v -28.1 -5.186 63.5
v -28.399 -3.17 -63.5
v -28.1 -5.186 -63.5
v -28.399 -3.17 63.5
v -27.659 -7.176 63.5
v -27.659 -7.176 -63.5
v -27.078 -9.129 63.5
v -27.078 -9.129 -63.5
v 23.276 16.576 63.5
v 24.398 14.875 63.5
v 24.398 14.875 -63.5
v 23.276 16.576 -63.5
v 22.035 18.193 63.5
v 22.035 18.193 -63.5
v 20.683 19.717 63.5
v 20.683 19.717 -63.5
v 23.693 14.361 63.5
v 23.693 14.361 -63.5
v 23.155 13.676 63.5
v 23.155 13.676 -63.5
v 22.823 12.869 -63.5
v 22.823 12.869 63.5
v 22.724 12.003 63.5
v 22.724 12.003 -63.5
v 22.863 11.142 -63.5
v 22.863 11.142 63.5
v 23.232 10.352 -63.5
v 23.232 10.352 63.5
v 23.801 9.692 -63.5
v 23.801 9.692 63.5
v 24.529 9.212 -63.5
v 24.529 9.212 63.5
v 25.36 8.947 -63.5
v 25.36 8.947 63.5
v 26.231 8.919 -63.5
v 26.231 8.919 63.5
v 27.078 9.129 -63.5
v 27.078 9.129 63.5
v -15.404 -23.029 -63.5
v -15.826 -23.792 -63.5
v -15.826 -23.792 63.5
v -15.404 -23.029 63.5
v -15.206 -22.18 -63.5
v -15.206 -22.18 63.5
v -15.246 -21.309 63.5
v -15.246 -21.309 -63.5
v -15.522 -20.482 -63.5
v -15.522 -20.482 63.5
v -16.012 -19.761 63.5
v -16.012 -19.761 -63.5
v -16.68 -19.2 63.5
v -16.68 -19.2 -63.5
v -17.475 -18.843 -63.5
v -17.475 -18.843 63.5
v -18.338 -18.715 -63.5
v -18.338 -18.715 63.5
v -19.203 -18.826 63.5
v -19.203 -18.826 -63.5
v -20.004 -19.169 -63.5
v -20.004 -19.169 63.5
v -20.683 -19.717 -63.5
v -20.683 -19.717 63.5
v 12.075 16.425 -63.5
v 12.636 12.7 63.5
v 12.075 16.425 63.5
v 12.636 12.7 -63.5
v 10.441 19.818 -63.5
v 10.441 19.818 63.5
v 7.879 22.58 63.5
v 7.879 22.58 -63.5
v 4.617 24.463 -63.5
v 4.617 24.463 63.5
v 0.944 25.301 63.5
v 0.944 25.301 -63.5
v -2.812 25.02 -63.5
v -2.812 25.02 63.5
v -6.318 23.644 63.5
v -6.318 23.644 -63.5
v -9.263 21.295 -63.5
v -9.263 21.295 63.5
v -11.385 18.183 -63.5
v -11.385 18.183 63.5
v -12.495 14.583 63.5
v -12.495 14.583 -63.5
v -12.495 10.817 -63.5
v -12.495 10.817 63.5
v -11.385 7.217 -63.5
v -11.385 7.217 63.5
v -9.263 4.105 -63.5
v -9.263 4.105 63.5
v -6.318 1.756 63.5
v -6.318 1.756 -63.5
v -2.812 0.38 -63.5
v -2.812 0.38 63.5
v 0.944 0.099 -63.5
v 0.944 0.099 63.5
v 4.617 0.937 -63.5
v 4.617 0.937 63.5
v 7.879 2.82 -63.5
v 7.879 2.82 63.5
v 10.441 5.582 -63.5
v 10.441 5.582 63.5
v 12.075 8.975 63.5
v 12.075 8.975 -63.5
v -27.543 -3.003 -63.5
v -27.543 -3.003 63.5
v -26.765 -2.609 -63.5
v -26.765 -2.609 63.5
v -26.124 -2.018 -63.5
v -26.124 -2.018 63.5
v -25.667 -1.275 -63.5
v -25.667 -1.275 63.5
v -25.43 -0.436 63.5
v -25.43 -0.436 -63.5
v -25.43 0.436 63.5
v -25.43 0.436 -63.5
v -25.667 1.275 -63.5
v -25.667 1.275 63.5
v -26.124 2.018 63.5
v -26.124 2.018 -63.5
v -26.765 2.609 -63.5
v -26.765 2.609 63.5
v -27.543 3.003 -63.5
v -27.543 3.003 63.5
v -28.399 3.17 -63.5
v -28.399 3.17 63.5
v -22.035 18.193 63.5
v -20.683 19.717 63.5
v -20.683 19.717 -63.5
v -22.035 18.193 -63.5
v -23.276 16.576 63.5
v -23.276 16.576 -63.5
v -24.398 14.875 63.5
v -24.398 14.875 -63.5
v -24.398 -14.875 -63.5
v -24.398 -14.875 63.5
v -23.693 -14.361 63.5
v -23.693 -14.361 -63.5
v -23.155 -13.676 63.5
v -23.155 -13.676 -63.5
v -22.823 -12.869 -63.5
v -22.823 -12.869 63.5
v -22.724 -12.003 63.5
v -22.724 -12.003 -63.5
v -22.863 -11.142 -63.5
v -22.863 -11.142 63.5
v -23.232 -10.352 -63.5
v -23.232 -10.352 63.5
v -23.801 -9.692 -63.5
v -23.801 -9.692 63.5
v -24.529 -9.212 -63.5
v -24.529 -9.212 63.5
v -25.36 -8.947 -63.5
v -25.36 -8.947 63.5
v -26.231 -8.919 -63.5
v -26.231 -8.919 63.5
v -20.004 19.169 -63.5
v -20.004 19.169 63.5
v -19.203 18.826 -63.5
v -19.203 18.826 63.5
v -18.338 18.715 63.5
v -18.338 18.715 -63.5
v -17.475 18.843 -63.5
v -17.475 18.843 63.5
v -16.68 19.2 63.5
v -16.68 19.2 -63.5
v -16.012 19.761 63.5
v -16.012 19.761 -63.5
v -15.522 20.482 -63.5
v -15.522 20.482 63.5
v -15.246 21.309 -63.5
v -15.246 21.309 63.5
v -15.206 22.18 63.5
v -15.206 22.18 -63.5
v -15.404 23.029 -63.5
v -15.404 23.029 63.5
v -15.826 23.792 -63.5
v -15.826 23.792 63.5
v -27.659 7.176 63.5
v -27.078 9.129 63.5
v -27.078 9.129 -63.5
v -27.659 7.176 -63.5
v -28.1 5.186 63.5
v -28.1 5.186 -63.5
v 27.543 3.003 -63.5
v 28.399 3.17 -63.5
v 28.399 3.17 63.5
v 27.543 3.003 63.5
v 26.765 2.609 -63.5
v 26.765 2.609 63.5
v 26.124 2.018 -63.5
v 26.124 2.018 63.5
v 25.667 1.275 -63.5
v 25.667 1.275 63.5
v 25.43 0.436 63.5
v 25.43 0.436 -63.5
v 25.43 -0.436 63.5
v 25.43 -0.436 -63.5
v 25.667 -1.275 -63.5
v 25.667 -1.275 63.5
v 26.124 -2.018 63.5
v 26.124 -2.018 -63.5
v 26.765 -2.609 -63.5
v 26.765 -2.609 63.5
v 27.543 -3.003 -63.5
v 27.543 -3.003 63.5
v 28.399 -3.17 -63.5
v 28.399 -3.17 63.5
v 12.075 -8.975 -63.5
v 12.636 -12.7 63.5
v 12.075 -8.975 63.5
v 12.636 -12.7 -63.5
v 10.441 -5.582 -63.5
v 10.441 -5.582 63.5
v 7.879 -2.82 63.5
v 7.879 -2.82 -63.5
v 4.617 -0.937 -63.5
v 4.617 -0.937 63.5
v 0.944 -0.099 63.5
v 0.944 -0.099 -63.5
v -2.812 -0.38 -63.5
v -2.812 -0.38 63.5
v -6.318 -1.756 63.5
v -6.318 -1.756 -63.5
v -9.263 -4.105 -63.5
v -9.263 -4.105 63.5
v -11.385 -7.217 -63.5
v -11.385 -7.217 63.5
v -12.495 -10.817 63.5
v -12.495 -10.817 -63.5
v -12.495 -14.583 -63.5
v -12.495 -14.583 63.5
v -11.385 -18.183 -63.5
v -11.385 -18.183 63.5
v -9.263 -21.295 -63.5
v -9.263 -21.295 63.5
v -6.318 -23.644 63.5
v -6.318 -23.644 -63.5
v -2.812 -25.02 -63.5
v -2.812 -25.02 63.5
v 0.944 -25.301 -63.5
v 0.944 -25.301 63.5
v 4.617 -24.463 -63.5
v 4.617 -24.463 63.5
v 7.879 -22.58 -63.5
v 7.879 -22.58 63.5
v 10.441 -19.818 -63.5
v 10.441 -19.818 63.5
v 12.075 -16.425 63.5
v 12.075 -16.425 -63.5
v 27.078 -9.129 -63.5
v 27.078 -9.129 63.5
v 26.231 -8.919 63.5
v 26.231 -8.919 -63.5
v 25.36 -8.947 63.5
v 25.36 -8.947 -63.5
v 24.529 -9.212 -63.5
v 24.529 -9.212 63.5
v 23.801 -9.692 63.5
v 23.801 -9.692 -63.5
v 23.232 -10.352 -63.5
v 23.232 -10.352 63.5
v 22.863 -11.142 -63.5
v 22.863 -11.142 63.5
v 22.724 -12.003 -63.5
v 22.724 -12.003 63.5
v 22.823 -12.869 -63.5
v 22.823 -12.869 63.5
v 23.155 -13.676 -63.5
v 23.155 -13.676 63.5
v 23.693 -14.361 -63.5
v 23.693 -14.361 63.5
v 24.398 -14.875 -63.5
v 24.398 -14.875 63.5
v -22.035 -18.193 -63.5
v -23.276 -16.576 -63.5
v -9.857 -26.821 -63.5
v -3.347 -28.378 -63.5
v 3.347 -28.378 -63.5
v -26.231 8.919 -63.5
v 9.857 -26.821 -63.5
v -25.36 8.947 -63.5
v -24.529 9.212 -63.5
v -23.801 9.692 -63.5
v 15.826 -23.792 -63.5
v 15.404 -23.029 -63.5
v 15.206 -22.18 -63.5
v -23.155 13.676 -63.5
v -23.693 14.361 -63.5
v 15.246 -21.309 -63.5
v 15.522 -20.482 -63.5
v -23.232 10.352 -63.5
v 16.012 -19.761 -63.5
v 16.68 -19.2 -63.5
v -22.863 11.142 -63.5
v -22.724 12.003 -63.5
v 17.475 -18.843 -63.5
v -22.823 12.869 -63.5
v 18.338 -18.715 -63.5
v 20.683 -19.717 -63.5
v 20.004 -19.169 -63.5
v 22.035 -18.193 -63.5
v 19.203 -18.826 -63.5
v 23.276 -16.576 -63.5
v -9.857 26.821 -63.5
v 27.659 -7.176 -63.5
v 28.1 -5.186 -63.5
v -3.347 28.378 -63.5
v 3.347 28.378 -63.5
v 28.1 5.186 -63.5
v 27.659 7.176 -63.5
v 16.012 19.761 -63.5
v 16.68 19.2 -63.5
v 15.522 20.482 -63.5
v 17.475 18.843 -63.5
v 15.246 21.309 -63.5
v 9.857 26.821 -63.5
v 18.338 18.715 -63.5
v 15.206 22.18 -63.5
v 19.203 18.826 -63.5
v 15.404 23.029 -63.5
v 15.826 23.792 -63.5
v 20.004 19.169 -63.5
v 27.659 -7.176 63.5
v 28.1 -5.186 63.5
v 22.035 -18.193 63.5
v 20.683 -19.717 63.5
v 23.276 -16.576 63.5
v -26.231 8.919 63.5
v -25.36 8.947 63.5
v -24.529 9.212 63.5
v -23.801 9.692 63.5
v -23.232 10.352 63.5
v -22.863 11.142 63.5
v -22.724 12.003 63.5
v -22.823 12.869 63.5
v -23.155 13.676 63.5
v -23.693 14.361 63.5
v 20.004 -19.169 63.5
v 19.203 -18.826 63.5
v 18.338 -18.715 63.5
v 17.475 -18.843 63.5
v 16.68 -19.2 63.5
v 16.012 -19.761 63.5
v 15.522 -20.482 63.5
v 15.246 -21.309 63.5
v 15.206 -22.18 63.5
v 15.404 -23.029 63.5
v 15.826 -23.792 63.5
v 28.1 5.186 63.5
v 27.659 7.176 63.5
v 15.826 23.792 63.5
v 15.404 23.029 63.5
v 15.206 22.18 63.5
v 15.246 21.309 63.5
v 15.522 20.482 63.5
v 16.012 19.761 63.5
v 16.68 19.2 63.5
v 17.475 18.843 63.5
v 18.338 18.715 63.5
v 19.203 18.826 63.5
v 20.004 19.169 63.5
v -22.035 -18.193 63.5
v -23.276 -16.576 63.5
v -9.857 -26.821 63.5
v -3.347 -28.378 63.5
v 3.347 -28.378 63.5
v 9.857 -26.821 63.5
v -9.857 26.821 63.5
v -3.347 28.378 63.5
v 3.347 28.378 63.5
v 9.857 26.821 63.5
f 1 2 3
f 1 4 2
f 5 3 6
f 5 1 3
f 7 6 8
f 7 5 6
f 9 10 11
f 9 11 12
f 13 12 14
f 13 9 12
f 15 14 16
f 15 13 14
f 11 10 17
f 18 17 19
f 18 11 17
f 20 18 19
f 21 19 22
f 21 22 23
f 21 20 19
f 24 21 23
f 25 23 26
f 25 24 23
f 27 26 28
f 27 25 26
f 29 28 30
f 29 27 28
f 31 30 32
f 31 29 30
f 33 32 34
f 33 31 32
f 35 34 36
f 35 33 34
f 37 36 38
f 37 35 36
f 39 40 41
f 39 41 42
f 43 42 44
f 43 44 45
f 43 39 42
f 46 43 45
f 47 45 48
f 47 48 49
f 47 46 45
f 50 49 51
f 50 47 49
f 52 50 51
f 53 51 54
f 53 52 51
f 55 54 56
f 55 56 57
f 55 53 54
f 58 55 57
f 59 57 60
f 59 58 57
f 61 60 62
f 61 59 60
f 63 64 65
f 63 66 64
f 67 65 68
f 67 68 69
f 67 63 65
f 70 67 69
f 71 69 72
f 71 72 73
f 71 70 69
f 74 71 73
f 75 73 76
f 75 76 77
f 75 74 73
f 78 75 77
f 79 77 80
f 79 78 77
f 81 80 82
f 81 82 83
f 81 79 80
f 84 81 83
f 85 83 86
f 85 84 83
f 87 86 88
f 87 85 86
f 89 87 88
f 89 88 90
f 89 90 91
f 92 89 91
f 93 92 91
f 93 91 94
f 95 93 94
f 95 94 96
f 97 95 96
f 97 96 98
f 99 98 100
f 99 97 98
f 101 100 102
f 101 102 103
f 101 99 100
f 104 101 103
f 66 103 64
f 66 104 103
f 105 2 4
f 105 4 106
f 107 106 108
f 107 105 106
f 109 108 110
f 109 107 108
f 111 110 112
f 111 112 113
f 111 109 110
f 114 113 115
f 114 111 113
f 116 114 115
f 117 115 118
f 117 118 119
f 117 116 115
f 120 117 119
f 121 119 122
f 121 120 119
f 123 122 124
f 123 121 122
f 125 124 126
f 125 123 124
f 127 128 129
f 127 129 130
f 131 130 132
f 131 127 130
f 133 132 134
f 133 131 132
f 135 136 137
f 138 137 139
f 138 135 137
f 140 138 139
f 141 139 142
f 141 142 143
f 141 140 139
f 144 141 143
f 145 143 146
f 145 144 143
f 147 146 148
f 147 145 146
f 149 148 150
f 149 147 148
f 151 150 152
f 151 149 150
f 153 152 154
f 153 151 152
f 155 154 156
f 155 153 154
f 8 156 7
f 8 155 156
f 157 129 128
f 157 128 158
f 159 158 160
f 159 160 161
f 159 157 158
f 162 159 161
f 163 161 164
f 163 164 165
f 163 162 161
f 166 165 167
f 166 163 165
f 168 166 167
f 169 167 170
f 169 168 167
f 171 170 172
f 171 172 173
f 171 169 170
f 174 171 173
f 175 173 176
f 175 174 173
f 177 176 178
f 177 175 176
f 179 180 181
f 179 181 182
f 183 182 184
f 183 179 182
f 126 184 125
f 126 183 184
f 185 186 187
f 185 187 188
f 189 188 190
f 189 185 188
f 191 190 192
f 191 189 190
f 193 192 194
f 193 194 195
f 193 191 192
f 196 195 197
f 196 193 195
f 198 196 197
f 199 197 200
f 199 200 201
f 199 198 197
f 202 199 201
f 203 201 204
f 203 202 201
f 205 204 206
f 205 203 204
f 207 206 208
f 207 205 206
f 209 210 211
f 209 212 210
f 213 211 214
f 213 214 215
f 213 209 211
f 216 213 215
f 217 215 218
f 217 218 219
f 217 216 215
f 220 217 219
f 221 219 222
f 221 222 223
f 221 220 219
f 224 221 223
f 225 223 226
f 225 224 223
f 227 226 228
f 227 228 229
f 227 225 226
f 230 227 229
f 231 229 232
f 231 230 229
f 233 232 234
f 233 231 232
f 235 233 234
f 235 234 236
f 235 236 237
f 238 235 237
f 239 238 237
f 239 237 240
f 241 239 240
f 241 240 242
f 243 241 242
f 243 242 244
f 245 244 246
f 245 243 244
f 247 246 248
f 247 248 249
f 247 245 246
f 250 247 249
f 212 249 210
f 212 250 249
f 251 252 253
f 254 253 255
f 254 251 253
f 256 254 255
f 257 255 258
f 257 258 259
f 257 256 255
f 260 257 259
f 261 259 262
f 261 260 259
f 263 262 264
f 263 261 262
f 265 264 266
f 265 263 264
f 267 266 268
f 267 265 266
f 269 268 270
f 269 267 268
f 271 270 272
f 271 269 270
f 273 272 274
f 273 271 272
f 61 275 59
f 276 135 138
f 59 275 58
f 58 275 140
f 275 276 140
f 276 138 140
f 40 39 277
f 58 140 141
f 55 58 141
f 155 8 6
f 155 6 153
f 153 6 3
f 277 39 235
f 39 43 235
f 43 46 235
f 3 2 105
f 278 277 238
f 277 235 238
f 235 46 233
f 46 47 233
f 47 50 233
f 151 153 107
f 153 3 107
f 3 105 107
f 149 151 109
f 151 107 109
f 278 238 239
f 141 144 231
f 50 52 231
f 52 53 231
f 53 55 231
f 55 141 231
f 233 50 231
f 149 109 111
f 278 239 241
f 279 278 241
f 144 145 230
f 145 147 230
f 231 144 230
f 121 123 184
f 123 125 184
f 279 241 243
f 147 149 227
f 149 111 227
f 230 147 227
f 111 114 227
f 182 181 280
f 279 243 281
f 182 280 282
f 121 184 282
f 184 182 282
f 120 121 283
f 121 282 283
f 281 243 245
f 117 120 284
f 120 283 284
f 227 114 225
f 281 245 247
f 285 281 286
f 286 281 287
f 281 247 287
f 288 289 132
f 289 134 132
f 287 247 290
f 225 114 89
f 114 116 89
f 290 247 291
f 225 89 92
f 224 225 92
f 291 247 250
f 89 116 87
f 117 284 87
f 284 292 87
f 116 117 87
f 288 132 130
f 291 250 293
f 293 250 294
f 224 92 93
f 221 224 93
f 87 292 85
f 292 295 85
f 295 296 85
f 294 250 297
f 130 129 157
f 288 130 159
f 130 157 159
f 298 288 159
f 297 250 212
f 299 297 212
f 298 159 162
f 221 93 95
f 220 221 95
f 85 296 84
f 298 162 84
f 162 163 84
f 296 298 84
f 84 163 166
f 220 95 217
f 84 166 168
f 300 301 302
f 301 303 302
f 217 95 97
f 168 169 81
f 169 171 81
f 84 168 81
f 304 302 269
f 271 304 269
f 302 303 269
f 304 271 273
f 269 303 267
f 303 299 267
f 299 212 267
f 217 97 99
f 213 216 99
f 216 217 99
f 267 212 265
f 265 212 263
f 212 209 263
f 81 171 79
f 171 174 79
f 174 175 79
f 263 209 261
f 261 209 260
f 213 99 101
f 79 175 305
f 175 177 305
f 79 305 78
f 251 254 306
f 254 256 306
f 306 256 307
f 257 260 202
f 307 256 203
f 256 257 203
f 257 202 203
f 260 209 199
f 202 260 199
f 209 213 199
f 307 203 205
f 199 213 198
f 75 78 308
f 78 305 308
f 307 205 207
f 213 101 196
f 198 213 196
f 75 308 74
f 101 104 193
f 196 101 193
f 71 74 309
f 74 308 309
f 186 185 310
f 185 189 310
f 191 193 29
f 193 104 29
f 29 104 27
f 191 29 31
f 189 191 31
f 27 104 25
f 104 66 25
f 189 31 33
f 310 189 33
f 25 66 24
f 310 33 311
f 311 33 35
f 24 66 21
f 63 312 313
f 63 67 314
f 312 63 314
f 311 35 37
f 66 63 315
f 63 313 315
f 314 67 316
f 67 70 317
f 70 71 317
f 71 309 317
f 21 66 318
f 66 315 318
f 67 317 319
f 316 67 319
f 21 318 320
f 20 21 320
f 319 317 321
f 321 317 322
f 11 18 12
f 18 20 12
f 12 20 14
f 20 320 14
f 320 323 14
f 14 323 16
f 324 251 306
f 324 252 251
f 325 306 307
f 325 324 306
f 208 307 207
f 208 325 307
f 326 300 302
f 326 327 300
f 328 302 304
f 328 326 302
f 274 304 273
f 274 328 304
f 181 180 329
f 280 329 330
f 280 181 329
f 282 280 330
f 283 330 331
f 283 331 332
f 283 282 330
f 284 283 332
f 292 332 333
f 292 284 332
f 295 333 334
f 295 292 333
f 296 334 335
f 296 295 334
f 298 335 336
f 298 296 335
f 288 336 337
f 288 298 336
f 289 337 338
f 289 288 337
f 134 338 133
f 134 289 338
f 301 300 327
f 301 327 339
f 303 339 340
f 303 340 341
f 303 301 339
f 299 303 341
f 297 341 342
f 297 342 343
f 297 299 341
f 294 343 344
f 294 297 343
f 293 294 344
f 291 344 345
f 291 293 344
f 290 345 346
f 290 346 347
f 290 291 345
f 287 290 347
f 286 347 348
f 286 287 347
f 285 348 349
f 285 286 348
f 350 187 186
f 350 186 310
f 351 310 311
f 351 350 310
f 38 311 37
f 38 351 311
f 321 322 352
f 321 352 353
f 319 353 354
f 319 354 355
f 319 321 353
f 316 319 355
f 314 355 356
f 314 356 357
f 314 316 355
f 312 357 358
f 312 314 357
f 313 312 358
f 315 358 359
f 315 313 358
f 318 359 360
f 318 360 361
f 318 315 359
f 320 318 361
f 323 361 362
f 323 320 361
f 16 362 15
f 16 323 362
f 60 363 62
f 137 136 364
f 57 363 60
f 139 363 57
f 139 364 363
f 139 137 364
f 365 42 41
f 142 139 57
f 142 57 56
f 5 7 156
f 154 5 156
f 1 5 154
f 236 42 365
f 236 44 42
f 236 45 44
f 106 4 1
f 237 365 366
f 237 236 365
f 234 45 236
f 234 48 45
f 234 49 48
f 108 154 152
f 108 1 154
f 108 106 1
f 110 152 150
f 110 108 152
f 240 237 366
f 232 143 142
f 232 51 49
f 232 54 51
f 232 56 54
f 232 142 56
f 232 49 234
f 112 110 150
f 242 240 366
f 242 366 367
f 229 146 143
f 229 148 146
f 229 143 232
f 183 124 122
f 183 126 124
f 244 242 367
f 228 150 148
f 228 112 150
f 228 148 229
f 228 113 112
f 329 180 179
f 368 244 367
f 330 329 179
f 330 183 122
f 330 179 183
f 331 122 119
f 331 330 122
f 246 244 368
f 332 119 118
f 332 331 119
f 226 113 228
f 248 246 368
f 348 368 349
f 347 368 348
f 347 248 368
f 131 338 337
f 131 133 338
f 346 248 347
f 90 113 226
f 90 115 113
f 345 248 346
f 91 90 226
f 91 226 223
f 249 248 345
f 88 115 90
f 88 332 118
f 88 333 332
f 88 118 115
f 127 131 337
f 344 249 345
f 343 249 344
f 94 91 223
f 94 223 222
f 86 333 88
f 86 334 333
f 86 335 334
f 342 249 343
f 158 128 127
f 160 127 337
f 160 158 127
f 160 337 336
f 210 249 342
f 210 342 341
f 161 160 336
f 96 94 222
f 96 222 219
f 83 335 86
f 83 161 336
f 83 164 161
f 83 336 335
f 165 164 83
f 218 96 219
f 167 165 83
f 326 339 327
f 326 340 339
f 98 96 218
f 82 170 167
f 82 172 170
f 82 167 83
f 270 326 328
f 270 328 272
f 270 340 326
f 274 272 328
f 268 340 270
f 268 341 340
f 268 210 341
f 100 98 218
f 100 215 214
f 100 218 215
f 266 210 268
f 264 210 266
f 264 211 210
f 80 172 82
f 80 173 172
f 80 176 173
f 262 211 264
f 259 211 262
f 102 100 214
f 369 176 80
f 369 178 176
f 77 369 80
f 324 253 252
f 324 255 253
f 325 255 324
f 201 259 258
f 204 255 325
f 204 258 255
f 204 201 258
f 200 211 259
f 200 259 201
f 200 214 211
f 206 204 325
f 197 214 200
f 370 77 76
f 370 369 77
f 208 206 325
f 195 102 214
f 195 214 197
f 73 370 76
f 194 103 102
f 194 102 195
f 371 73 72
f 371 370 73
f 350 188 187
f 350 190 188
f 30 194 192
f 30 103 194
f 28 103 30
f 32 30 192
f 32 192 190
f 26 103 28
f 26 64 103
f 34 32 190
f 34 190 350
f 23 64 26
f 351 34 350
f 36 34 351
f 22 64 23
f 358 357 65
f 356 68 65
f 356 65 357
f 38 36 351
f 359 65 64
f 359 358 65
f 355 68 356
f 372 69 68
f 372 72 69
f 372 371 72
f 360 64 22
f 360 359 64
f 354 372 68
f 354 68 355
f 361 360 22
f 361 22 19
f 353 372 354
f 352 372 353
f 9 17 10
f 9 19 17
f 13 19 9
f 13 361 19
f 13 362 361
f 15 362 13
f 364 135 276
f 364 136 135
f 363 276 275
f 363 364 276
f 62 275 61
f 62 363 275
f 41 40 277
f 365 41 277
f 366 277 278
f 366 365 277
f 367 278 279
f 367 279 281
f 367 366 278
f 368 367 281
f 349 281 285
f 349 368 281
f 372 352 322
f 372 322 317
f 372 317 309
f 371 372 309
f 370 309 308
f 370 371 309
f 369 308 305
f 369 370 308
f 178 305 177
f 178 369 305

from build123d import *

# Parameters (mm, degrees)
F0_R     = 28.575
F0_R_2   = 12.6365
F1_DEPTH = 63.5
F4_DEPTH = 127


with BuildPart() as f1:
    # F0 (on Top) → F1 (new body, symmetric)
    with BuildSketch(Plane.XY):
        Circle(F0_R)
        with Locations((0, -12.7)):
            Circle(F0_R_2, mode=Mode.SUBTRACT)
        with Locations((0, 12.7)):
            Circle(F0_R_2, mode=Mode.SUBTRACT)
    extrude(amount=F1_DEPTH, both=True)

    # F3 (on offset) → F4 (cut)
    with BuildSketch(Plane.XY.offset(-63.5)):
        with BuildLine():
            ThreePointArc((15.8258405296, -23.792297), (18.3676559468, -21.8897199621), (20.6827101795, -19.716899468))
            ThreePointArc((20.6827101795, -19.716899468), (16.326805286, -19.4575288553), (15.8258405296, -23.792297))
        make_face()
        with BuildLine():
            ThreePointArc((24.3981417093, -14.8748548273), (25.8977450146, -12.0763168292), (27.0776230728, -9.1286884999))
            ThreePointArc((27.0776230728, -9.1286884999), (23.0202177907, -10.7345038482), (24.3981417093, -14.8748548273))
        make_face()
        with BuildLine():
            ThreePointArc((28.3986111111, -3.1700965222), (28.575, 0), (28.3986111111, 3.1700965222))
            ThreePointArc((28.3986111111, 3.1700965222), (25.4, 0), (28.3986111111, -3.1700965222))
        make_face()
        with BuildLine():
            ThreePointArc((27.0776230728, 9.1286884999), (25.8977450146, 12.0763168292), (24.3981417093, 14.8748548273))
            ThreePointArc((24.3981417093, 14.8748548273), (23.0202177907, 10.7345038482), (27.0776230728, 9.1286884999))
        make_face()
        with BuildLine():
            ThreePointArc((20.6827101795, 19.716899468), (18.3676559468, 21.8897199621), (15.8258405296, 23.792297))
            ThreePointArc((15.8258405296, 23.792297), (16.326805286, 19.4575288553), (20.6827101795, 19.716899468))
        make_face()
        with BuildLine():
            ThreePointArc((-20.6827101795, 19.716899468), (-16.326805286, 19.4575288553), (-15.8258405296, 23.792297))
            ThreePointArc((-15.8258405296, 23.792297), (-18.3676559468, 21.8897199621), (-20.6827101795, 19.716899468))
        make_face()
        with BuildLine():
            ThreePointArc((-27.0776230728, 9.1286884999), (-23.0202177907, 10.7345038482), (-24.3981417093, 14.8748548273))
            ThreePointArc((-24.3981417093, 14.8748548273), (-25.8977450146, 12.0763168292), (-27.0776230728, 9.1286884999))
        make_face()
        with BuildLine():
            ThreePointArc((-28.3986111111, -3.1700965222), (-25.4, 0), (-28.3986111111, 3.1700965222))
            ThreePointArc((-28.3986111111, 3.1700965222), (-28.575, 0), (-28.3986111111, -3.1700965222))
        make_face()
        with BuildLine():
            ThreePointArc((-24.3981417093, -14.8748548273), (-23.0202177907, -10.7345038482), (-27.0776230728, -9.1286884999))
            ThreePointArc((-27.0776230728, -9.1286884999), (-25.8977450146, -12.0763168292), (-24.3981417093, -14.8748548273))
        make_face()
        with BuildLine():
            ThreePointArc((-15.8258405296, -23.792297), (-16.326805286, -19.4575288553), (-20.6827101795, -19.716899468))
            ThreePointArc((-20.6827101795, -19.716899468), (-18.3676559468, -21.8897199621), (-15.8258405296, -23.792297))
        make_face()
    extrude(amount=F4_DEPTH, mode=Mode.SUBTRACT)


solid = f1.part
